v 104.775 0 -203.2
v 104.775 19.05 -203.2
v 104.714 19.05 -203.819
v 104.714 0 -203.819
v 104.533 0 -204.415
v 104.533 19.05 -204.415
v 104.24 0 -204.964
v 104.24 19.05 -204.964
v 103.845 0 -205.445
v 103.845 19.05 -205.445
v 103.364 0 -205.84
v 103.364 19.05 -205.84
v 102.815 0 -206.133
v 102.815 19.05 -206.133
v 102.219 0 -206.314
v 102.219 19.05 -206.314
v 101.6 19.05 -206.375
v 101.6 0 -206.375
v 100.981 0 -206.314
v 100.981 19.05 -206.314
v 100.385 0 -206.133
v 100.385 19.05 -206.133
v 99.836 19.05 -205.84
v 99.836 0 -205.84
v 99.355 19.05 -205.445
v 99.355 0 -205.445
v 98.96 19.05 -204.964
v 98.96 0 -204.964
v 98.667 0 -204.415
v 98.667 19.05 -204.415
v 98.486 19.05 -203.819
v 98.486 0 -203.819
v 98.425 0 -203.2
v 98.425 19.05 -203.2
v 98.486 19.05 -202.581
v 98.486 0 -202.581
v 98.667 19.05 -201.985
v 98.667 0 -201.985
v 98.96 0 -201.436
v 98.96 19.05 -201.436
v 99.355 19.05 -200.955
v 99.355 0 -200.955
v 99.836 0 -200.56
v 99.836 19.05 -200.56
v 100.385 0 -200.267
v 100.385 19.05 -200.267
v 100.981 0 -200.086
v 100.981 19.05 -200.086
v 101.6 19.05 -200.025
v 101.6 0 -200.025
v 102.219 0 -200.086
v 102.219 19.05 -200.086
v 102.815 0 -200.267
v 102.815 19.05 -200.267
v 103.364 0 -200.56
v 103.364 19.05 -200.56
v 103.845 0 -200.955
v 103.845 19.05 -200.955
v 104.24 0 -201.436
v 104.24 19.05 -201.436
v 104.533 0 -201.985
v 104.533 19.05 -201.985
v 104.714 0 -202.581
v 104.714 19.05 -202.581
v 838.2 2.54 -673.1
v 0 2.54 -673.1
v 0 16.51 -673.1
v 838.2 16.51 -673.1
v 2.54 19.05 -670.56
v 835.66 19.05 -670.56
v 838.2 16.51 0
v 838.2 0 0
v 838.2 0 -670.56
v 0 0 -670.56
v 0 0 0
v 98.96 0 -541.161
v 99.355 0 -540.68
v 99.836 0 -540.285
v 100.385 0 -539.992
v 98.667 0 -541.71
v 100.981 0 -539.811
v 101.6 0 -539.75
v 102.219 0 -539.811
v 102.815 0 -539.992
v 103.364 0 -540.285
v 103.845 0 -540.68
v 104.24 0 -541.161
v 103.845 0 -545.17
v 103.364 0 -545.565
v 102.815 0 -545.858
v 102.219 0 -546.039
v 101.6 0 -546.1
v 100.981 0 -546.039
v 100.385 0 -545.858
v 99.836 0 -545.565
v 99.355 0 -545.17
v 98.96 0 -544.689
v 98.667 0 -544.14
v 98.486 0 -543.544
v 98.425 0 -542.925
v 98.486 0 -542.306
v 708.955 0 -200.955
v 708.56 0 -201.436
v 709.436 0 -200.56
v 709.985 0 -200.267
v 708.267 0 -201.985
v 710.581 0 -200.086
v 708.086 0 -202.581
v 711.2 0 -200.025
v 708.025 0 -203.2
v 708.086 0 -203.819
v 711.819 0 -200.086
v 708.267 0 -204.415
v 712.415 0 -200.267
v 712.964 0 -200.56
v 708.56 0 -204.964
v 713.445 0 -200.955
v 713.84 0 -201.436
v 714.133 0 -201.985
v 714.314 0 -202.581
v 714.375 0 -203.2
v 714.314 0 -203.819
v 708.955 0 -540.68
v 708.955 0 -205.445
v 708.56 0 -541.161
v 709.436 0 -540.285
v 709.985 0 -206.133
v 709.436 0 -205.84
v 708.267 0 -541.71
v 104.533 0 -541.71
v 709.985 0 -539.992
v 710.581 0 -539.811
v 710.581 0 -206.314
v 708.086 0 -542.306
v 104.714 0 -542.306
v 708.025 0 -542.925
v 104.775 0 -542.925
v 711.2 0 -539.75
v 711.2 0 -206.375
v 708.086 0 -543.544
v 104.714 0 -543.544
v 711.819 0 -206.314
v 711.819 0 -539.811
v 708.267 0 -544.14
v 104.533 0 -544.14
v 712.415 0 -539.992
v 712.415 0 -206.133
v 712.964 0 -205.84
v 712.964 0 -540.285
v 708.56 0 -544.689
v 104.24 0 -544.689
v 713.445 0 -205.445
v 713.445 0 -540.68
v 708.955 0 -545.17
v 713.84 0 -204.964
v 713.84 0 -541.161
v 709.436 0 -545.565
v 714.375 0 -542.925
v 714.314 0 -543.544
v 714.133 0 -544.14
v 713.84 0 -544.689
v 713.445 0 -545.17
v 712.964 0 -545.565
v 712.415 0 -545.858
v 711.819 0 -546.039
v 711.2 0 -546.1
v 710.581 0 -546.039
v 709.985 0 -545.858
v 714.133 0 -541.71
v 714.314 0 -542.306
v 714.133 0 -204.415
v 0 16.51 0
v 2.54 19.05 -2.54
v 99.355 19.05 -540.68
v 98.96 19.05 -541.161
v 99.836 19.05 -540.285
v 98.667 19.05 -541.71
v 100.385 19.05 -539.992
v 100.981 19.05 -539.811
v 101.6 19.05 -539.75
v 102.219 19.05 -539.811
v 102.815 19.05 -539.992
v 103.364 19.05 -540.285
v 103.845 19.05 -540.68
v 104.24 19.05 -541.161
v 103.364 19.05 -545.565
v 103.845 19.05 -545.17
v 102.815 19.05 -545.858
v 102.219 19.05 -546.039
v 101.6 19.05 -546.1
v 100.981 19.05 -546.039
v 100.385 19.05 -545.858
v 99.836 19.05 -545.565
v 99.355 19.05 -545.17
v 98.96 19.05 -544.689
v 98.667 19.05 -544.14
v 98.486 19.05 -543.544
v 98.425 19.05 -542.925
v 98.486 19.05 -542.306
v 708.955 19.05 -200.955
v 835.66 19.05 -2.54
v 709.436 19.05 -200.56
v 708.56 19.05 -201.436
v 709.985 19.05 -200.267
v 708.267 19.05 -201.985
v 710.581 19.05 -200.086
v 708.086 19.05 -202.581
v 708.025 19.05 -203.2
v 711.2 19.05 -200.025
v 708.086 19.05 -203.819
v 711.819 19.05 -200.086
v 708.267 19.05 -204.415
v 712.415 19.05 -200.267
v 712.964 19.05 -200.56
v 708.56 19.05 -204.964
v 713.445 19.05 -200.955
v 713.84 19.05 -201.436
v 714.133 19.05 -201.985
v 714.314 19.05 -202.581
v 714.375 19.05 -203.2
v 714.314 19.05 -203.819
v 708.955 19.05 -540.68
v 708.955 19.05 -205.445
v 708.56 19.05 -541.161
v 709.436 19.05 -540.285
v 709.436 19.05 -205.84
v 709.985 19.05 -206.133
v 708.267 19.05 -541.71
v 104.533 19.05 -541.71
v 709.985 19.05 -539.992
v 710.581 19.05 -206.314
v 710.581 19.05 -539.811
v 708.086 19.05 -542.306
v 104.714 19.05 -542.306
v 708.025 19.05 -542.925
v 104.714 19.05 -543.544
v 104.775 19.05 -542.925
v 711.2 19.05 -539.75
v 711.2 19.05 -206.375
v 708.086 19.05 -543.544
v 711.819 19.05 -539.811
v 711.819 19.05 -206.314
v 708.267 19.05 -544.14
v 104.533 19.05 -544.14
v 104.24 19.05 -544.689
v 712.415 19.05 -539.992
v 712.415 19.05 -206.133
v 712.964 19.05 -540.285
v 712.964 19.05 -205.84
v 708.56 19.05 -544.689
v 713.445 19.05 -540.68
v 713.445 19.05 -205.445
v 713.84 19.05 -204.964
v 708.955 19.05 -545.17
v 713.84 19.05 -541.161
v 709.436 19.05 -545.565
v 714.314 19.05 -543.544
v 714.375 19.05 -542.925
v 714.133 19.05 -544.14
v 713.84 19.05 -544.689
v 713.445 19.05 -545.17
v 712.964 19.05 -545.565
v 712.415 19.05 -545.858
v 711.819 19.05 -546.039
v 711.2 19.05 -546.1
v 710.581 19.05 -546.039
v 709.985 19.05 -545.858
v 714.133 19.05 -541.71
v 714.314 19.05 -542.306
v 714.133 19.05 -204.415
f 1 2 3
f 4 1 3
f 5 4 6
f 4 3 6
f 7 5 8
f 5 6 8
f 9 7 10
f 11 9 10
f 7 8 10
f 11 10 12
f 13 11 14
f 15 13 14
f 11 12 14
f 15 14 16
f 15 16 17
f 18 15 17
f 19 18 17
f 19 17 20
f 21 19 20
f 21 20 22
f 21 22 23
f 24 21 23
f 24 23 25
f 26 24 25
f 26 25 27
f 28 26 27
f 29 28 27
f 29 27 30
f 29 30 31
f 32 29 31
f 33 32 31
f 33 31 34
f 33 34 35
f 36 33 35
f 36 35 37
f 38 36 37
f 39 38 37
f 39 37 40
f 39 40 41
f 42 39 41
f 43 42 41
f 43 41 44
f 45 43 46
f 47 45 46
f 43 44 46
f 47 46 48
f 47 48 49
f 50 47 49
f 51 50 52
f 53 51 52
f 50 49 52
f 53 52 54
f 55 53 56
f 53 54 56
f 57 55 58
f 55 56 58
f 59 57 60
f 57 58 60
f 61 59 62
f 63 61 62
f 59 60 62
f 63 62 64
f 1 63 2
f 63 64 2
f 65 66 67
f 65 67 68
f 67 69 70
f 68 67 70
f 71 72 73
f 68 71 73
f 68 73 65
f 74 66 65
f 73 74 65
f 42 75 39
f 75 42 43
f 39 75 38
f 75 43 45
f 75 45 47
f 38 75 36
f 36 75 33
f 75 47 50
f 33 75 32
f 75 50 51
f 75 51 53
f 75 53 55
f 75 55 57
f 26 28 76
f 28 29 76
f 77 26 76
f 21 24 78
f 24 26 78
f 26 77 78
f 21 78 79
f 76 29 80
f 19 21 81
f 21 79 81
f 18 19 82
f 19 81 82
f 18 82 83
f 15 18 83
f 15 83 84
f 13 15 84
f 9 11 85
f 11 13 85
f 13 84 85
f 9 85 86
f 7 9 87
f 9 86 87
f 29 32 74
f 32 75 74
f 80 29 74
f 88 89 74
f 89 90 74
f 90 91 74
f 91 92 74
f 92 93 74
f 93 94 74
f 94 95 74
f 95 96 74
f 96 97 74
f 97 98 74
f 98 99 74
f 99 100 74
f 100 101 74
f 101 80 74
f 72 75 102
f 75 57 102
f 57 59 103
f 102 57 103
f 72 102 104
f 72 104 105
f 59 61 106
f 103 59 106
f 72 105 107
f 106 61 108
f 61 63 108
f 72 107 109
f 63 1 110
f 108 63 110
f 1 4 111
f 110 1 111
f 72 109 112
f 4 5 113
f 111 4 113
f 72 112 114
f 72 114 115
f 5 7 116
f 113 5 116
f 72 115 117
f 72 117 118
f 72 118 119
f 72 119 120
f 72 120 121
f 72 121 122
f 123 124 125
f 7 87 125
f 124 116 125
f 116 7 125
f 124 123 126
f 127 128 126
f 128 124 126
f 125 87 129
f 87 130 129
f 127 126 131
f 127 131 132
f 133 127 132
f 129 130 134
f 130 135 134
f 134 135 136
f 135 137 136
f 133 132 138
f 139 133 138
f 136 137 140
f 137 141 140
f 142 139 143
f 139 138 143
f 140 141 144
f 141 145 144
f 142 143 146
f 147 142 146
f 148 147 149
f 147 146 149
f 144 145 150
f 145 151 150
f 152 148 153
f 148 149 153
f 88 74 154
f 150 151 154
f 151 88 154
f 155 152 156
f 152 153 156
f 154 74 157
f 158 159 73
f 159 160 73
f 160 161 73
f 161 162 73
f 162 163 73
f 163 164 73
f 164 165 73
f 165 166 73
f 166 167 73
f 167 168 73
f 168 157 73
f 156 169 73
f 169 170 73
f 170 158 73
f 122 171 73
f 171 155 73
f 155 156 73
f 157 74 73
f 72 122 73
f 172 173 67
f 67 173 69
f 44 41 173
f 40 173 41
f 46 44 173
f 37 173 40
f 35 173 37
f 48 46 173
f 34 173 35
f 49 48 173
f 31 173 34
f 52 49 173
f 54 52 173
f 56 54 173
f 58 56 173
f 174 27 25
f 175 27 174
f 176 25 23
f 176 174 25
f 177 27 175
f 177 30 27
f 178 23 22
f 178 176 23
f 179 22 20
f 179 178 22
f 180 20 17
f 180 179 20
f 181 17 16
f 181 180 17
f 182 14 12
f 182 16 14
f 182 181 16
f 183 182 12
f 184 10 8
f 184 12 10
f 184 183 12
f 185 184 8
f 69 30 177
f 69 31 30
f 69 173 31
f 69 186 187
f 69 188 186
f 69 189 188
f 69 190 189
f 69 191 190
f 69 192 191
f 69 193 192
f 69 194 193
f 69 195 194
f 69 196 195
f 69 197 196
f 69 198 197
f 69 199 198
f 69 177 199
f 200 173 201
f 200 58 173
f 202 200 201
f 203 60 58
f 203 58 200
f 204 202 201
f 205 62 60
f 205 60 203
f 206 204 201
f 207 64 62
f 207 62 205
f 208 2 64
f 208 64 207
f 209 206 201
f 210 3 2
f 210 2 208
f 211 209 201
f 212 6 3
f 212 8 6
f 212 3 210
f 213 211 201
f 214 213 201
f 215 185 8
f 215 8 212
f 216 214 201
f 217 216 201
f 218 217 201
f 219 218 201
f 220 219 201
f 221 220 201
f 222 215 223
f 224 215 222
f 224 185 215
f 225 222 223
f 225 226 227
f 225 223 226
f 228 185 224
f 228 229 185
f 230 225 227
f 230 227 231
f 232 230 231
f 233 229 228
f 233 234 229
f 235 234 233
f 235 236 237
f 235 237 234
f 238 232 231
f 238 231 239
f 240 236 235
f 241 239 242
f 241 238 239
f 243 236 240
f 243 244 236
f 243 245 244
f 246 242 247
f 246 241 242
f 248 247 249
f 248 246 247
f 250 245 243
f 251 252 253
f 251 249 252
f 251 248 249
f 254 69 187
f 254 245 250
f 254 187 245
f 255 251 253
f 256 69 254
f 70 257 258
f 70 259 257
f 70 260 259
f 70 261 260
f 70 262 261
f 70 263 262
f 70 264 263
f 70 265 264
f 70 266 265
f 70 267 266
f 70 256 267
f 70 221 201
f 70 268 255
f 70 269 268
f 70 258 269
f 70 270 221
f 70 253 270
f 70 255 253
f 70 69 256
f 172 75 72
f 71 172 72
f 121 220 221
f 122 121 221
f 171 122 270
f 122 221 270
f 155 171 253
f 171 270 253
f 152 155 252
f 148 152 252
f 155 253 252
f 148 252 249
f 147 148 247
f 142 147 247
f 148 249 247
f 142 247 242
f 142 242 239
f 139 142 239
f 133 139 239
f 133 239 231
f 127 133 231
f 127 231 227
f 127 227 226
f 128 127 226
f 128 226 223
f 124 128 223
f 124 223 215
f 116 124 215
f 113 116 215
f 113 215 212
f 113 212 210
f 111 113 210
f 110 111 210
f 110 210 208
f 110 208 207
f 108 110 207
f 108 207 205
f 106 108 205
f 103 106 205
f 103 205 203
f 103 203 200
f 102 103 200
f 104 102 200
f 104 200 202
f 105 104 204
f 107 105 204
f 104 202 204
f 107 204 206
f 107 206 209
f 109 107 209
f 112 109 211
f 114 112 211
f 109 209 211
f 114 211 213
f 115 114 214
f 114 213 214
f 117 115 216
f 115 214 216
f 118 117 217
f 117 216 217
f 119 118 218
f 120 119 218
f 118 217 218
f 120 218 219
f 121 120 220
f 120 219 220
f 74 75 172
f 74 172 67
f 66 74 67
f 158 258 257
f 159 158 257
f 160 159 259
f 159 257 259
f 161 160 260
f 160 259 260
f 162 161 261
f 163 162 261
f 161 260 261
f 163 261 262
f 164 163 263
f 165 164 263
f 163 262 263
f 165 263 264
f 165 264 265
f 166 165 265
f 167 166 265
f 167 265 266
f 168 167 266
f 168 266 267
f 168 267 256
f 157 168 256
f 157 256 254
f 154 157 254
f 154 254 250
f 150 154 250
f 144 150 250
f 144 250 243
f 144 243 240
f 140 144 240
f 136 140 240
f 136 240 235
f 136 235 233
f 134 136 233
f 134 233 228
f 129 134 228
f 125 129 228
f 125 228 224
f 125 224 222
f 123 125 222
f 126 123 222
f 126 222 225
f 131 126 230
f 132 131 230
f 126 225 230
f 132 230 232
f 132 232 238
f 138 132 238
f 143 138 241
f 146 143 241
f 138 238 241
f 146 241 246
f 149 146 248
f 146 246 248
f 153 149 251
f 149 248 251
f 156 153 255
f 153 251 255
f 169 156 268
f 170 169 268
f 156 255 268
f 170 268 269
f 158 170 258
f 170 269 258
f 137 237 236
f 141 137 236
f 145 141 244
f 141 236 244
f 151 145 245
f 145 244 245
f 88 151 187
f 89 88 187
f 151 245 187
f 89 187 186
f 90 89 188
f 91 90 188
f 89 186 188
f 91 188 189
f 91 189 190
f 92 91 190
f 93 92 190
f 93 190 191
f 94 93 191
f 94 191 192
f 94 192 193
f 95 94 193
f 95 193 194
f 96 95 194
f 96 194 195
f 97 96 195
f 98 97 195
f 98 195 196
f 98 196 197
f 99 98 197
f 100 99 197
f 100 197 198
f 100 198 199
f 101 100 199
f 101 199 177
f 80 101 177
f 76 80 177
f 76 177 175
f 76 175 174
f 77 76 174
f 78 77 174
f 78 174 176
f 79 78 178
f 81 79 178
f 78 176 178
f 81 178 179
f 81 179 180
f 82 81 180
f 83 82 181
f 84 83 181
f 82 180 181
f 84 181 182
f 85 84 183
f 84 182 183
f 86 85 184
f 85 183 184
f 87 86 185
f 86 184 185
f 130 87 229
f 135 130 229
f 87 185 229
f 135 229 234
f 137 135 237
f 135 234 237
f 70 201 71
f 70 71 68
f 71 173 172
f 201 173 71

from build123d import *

# Parameters (mm, degrees)
SKETCH1_W           = 838.2
SKETCH1_H           = 673.1
BOSS_EXTRUDE1_DEPTH = 19.05
CHAMFER1_SIZE       = 2.54
CHAMFER2_SIZE       = 2.54
SKETCH2_R           = 3.175
CUT_EXTRUDE1_DEPTH  = 20.05


with BuildPart() as part:
    # Sketch1 → Boss-Extrude1 (new body)
    with BuildSketch(Plane(origin=(0, 0, 0), x_dir=(1, 0, 0), z_dir=(0, 1, 0))):
        with Locations((419.1, 336.55)):
            Rectangle(SKETCH1_W, SKETCH1_H)
    extrude(amount=BOSS_EXTRUDE1_DEPTH)

    # Chamfer1
    chamfer1_edges = [part.edges().sort_by_distance(p)[0] for p in [
        (838.2, 19.05, -336.55),
        (419.1, 19.05, -673.1),
        (0, 19.05, -336.55),
        (419.1, 19.05, 0),
    ]]
    chamfer(chamfer1_edges, length=CHAMFER1_SIZE)

    # Chamfer2
    chamfer2_edges = [part.edges().sort_by_distance(p)[0] for p in [
        (419.1, 0, -673.1),
    ]]
    chamfer(chamfer2_edges, length=CHAMFER2_SIZE)

    # Sketch2 → Cut-Extrude1 (cut, through all)
    with BuildSketch(Plane(origin=(0, 19.05, 0), x_dir=(1, 0, 0), z_dir=(0, 1, 0))):
        with Locations((101.6, 542.925)):
            Circle(SKETCH2_R)
        with Locations((101.6, 203.2)):
            Circle(SKETCH2_R)
        with Locations((711.2, 542.925)):
            Circle(SKETCH2_R)
        with Locations((711.2, 203.2)):
            Circle(SKETCH2_R)
    extrude(amount=-CUT_EXTRUDE1_DEPTH, mode=Mode.SUBTRACT)


solid = part.part
